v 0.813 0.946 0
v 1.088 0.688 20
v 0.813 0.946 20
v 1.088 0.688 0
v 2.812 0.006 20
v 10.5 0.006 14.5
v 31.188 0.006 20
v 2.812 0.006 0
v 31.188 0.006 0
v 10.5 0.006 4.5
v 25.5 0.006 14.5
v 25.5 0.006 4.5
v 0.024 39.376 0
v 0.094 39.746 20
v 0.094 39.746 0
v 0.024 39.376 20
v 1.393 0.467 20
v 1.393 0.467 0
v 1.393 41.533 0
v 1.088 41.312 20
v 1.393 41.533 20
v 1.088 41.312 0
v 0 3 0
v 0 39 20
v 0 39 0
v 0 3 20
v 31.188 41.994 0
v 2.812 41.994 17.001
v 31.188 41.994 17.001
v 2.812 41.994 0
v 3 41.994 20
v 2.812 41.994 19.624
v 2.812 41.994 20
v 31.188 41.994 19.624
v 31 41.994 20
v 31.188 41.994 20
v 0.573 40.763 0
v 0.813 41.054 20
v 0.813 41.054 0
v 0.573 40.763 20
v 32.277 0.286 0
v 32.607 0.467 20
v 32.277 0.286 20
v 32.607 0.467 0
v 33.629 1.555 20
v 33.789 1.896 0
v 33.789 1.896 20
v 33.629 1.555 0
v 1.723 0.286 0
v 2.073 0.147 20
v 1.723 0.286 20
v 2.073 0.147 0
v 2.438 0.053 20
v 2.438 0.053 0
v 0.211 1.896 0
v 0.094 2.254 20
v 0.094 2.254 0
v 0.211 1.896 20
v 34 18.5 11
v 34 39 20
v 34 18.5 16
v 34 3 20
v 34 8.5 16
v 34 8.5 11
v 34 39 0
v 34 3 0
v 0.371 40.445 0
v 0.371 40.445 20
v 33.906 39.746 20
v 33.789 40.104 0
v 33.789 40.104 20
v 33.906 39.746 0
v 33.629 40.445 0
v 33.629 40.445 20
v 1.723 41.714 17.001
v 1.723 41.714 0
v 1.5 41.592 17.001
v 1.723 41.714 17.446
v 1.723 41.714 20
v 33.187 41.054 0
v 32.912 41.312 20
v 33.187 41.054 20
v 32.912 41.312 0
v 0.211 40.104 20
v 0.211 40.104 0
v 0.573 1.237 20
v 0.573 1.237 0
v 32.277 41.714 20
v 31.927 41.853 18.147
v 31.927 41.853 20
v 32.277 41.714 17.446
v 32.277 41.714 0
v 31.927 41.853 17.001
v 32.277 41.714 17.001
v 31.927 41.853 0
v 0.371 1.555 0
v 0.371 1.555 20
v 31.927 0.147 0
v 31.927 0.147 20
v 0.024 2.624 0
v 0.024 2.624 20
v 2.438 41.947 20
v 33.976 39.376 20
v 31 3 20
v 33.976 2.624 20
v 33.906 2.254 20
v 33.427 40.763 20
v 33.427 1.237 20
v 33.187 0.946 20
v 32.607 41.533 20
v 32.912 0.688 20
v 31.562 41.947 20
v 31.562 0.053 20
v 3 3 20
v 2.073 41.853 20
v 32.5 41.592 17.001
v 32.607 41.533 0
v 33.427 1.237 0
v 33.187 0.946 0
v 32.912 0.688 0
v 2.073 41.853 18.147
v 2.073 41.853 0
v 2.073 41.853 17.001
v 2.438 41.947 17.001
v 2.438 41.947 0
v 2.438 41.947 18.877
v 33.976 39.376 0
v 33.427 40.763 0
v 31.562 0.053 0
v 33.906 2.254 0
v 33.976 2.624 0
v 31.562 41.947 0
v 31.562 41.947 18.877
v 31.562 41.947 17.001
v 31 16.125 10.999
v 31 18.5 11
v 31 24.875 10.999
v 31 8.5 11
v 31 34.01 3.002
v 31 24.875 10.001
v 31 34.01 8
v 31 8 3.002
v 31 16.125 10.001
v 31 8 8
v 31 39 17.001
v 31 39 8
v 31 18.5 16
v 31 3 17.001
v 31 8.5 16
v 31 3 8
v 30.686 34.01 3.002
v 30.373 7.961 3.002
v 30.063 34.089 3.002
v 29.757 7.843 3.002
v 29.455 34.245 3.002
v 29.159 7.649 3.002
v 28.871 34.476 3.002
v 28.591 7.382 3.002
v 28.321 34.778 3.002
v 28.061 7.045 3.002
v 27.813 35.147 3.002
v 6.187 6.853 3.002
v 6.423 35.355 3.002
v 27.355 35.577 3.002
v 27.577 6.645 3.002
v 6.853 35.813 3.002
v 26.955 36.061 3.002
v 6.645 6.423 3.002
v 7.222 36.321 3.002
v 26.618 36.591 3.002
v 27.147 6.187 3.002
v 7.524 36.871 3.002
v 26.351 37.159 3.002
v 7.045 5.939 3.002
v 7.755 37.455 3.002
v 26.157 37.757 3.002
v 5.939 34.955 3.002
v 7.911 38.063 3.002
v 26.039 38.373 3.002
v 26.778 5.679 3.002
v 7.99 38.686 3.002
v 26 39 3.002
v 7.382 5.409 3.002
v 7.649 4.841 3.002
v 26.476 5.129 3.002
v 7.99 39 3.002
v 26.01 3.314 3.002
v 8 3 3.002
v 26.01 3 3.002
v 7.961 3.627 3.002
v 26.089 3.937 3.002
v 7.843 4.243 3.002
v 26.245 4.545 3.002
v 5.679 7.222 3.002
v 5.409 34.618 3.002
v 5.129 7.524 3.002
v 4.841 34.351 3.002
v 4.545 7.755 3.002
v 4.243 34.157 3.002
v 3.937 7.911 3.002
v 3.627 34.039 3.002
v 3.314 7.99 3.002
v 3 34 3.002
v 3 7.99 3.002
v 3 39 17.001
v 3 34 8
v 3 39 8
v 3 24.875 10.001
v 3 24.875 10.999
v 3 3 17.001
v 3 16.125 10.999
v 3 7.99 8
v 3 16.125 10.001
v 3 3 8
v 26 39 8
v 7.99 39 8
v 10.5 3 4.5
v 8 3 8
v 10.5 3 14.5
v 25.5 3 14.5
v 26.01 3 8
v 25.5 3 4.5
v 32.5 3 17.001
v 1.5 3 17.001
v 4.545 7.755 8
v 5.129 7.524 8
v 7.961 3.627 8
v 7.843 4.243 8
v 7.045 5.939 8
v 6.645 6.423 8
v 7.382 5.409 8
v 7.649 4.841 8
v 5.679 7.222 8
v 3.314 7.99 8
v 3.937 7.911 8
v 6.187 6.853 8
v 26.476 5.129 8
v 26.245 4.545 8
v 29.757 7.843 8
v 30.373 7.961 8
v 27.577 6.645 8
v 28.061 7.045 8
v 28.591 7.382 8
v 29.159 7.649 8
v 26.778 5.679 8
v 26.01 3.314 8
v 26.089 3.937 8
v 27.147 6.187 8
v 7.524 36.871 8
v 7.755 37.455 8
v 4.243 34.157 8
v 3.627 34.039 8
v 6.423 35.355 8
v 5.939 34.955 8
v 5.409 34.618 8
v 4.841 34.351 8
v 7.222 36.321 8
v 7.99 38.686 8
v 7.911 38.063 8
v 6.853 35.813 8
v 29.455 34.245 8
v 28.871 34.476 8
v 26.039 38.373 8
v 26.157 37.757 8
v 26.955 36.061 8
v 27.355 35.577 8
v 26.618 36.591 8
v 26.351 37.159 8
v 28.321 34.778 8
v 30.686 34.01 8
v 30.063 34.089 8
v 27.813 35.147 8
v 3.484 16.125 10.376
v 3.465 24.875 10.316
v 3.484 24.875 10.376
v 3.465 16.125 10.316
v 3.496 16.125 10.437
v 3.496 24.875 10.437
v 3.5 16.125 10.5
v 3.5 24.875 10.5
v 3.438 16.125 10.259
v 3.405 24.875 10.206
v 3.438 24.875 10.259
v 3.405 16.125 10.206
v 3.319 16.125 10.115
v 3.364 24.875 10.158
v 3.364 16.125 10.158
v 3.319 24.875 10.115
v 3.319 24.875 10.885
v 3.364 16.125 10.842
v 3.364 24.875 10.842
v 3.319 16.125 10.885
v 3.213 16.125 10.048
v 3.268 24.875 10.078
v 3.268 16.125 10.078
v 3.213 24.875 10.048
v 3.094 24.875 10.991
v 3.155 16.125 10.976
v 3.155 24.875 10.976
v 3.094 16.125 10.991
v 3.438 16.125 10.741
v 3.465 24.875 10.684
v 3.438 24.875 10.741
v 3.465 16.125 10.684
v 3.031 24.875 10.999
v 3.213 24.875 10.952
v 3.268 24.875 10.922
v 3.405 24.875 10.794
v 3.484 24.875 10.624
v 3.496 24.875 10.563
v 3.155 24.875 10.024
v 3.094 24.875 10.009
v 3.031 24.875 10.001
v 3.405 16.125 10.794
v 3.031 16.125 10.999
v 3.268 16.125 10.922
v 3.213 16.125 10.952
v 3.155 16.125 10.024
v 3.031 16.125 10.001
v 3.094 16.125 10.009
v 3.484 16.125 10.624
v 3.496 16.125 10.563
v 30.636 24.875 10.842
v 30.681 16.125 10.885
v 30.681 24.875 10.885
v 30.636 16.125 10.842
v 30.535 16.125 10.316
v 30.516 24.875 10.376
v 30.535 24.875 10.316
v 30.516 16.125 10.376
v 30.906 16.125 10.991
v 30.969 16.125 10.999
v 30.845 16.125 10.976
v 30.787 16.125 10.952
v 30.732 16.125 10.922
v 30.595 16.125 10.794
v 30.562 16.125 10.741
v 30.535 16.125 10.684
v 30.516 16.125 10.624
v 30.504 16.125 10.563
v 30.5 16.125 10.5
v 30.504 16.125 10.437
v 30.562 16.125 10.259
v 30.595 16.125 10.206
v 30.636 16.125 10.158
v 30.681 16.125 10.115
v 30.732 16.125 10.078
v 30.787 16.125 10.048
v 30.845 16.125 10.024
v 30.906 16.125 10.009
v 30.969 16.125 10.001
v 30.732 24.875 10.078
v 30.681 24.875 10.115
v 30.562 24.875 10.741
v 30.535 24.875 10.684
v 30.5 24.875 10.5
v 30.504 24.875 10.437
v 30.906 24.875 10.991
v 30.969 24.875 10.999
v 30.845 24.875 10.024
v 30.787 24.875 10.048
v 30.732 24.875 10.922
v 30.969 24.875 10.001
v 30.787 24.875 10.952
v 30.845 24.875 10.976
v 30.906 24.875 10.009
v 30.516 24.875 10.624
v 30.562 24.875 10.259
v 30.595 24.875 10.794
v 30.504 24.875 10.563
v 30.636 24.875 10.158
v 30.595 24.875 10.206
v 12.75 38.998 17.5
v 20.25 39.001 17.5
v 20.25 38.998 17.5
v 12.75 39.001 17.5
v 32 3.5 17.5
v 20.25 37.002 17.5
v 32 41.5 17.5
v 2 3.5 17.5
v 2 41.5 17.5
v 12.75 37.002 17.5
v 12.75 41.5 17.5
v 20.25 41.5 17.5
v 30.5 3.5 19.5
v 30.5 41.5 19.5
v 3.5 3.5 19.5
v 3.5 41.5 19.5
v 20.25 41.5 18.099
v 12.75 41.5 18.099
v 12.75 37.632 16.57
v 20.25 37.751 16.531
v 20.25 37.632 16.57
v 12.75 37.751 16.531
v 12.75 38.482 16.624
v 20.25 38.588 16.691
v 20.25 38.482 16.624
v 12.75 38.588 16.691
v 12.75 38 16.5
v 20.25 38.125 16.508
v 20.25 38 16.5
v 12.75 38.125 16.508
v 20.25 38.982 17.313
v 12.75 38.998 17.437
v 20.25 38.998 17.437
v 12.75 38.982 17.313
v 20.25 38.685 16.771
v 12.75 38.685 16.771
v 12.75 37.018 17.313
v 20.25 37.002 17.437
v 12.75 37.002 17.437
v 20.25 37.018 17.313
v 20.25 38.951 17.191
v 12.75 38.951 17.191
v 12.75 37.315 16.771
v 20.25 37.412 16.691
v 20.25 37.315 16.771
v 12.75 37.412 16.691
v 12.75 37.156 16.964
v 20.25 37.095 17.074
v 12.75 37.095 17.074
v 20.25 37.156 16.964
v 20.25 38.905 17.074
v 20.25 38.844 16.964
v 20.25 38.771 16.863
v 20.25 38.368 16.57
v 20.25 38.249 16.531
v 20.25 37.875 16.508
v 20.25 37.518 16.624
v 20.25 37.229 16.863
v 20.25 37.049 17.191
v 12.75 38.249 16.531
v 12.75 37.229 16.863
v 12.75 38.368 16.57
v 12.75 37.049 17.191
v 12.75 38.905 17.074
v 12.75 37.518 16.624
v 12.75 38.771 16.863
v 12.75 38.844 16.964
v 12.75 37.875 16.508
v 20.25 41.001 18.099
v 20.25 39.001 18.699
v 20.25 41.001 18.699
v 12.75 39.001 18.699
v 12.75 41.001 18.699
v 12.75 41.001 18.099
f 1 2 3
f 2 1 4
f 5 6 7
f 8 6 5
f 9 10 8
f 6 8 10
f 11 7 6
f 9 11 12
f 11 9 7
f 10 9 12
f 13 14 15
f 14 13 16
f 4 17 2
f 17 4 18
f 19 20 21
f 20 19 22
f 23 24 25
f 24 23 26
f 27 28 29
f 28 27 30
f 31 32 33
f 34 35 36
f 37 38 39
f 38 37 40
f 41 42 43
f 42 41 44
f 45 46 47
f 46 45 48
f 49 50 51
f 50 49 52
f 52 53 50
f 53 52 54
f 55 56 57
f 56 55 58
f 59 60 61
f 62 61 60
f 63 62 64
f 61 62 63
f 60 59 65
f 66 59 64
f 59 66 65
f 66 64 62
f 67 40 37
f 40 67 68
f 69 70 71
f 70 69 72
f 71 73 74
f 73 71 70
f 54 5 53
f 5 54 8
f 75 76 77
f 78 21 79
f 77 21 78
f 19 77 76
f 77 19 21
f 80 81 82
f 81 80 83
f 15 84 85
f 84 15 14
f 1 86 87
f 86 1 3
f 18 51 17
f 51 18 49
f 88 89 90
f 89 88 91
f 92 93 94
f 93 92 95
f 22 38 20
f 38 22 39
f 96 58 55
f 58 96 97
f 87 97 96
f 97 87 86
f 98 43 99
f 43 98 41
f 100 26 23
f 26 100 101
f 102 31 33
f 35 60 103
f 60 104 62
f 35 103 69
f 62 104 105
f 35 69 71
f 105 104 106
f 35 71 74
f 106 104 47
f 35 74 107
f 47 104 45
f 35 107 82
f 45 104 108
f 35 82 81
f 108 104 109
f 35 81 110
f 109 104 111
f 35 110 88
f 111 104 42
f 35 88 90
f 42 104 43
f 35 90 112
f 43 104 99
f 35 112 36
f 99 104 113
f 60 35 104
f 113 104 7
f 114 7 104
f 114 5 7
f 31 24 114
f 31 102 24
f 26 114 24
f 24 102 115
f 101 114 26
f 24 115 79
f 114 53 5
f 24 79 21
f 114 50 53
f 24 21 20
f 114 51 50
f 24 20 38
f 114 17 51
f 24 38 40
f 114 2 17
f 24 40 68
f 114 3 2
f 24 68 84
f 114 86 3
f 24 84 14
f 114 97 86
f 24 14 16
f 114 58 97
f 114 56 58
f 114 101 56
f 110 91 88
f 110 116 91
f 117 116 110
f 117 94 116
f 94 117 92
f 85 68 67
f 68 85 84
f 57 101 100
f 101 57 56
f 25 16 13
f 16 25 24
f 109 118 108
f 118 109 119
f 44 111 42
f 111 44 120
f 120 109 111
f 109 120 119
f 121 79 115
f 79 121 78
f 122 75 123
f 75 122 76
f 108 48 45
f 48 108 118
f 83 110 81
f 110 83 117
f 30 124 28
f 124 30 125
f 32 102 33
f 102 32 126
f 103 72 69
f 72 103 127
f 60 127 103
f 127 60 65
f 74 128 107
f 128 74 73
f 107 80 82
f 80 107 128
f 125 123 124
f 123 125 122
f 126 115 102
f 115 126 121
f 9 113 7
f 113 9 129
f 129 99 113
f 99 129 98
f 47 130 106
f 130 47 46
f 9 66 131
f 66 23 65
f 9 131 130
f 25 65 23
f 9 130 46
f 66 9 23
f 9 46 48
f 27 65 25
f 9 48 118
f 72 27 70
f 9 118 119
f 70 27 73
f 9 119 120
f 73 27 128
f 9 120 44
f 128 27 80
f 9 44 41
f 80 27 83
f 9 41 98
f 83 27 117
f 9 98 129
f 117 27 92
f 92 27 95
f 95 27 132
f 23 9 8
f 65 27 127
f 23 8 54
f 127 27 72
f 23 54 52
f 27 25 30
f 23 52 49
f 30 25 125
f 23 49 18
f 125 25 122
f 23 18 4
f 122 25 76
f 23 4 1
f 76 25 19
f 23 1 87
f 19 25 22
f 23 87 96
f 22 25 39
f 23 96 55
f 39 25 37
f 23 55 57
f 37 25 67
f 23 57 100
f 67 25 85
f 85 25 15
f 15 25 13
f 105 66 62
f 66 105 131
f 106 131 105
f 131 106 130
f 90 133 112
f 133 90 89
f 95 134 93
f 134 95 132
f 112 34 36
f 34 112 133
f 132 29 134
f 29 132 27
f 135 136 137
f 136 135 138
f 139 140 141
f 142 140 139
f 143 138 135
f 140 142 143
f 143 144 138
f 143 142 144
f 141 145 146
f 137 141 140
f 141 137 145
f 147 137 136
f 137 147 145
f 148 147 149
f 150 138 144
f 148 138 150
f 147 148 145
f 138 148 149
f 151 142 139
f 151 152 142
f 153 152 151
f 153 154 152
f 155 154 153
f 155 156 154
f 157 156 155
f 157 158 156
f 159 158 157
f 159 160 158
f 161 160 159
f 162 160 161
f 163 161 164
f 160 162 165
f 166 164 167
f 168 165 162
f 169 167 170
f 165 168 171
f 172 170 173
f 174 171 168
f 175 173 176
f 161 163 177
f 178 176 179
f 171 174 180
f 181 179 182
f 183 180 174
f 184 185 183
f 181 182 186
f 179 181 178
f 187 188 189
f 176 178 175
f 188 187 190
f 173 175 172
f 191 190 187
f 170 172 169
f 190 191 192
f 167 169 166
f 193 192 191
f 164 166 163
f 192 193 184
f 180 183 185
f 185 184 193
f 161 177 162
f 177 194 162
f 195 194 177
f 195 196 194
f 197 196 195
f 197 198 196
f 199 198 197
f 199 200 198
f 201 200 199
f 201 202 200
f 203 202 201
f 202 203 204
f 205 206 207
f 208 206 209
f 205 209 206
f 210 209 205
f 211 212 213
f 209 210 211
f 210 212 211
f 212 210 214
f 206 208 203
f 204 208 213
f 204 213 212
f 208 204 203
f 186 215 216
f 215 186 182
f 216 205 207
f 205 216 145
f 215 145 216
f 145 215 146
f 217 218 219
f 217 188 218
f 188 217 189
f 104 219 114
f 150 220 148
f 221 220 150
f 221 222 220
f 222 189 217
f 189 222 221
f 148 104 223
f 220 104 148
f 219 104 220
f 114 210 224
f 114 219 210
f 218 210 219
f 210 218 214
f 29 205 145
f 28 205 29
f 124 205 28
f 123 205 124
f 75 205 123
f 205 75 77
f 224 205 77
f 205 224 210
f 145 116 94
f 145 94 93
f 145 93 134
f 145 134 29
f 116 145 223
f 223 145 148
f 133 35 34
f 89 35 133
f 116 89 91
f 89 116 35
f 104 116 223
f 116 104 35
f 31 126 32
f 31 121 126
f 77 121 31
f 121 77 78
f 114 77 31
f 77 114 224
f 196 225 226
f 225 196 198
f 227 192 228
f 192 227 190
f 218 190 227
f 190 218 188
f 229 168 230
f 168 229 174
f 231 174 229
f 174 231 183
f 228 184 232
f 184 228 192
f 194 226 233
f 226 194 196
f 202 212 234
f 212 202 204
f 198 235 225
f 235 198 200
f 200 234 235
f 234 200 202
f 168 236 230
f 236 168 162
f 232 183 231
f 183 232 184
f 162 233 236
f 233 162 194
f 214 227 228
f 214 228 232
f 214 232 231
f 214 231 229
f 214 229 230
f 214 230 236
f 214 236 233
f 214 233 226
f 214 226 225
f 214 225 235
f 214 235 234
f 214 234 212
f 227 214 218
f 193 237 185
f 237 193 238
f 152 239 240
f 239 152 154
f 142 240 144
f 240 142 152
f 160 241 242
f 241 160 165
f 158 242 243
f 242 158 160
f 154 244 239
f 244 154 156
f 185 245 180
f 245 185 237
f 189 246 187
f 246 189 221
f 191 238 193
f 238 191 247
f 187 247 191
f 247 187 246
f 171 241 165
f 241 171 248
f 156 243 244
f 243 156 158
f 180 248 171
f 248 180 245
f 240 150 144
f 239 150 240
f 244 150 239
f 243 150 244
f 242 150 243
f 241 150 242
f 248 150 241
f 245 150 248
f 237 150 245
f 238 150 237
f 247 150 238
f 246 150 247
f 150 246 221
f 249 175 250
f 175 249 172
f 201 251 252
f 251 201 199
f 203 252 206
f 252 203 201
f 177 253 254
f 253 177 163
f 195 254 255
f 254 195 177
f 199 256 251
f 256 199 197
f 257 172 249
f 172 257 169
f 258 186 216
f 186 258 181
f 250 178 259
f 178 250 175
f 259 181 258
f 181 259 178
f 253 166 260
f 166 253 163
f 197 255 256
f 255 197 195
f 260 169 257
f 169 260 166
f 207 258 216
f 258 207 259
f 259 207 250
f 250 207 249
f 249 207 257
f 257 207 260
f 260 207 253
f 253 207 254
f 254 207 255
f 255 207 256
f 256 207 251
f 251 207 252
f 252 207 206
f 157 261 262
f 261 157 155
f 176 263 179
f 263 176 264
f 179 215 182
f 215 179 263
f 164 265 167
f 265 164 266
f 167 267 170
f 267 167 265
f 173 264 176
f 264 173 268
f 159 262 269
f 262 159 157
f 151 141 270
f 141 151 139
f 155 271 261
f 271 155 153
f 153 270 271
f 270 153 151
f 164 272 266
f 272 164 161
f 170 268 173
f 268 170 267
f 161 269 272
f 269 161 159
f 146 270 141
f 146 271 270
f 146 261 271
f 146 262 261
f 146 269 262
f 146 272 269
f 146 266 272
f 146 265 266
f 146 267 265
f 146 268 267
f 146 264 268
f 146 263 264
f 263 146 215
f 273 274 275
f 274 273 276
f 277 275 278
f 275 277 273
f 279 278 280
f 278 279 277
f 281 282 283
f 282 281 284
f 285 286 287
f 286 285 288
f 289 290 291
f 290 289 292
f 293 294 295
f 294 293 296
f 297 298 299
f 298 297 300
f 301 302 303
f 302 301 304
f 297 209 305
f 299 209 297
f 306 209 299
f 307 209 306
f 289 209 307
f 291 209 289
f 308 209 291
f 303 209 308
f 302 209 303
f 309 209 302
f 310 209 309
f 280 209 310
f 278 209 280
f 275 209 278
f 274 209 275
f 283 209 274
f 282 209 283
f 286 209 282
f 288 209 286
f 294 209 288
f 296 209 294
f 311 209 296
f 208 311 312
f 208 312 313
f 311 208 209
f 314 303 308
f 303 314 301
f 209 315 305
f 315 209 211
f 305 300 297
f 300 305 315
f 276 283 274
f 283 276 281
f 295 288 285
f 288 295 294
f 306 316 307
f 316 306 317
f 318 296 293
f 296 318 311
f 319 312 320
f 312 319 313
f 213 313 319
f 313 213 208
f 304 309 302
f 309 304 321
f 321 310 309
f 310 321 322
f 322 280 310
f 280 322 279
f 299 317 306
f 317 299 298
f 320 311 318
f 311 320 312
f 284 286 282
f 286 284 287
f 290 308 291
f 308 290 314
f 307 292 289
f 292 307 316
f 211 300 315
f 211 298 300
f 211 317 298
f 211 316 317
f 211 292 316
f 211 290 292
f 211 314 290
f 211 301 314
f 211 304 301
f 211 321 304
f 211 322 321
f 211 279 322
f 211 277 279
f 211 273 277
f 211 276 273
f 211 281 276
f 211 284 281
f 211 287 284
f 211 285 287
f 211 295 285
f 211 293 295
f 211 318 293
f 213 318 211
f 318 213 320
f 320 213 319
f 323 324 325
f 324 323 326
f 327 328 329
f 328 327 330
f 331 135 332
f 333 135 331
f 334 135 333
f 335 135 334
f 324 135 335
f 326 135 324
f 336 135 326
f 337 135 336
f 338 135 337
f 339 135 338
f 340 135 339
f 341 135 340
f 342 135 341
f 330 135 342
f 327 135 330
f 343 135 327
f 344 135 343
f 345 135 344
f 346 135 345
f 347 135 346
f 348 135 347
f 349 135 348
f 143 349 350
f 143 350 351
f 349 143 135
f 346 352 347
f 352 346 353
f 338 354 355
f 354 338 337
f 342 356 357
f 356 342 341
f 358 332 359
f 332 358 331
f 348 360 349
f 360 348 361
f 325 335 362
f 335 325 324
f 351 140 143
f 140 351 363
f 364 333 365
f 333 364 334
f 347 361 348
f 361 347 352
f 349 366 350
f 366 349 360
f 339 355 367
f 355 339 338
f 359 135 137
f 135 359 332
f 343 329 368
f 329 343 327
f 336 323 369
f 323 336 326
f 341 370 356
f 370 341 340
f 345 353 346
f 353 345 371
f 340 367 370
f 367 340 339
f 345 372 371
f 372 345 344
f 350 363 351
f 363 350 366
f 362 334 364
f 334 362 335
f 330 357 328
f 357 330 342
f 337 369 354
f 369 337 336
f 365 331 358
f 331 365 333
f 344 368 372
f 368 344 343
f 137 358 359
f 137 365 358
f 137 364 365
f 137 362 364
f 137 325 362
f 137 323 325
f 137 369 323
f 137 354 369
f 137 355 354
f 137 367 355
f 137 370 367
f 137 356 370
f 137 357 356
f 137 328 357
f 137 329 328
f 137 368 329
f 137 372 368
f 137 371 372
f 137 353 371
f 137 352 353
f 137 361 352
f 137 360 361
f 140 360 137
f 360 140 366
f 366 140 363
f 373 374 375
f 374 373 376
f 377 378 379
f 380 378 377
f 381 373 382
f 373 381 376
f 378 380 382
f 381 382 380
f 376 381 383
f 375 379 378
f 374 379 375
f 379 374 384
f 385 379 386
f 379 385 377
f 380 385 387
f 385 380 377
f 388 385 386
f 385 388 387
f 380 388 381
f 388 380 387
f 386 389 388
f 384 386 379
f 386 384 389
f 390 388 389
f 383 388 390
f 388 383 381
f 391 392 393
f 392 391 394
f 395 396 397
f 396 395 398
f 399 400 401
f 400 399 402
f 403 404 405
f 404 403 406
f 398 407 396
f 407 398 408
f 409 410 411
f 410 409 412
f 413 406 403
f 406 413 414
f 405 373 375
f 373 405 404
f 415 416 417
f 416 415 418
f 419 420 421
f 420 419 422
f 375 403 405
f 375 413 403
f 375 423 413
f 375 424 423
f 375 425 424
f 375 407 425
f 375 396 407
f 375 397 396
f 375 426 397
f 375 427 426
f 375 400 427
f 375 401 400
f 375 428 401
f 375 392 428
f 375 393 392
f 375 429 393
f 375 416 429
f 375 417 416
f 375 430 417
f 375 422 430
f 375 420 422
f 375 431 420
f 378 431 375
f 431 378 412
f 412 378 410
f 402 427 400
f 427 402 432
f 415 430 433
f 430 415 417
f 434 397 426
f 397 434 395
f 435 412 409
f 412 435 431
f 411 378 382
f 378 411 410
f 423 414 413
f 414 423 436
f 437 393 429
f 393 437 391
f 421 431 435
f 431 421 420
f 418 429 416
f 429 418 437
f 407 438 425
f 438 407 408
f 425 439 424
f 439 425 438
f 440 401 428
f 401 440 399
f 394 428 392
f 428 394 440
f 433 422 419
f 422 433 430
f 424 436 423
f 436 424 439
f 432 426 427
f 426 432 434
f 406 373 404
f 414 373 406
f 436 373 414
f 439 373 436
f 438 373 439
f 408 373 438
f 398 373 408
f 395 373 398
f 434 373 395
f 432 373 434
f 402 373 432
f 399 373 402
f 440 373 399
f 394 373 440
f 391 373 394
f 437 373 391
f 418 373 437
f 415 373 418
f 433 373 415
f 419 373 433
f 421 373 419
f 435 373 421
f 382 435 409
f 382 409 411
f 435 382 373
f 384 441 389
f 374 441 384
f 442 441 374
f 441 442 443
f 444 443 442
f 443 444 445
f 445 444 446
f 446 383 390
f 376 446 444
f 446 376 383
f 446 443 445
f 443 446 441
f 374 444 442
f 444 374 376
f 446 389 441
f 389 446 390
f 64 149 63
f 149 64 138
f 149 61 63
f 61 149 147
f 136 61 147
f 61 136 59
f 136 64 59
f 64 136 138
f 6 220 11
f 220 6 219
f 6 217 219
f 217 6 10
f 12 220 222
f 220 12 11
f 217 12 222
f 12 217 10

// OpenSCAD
// file: project_box.scad
/* Project box

   A parametric box for electronics projects using perforated circuit boards. The
   board is held above the bottom of the box by four corner supports, and snaps
   into place to hold it snugly while allowing easy removal.

   Shapes provided as children will be used as cutouts, translated to the origin
   point of the top of the circuit board. Modules are provided for cutting out
   two-dimensional shapes from each wall face as well as the lid.
*/

$fn=50;

mode = "case";         // ["case", "lid", "all"]
board_x = 50;
board_y = 70;
board_thickness = 1;   // [1:10]
clearance_above = 20;  // [5:50]
clearance_below = 10;  // [5:50]
fit_tolerance = 0.5;
corner_radius=3;       // [1:10]
support_radius=5;      // [1:10]
wall_width=3;          // [3:10]

module _rounded_box(box, r) {
  hull() {
    translate([0 + r,0 + r,0])
      cylinder(h=box.z,r=r);
    translate([box.x - r,0 + r,0])
      cylinder(h=box.z, r=r);
    translate([box.x - r,box.y - r,0])
      cylinder(h=box.z, r=r);
    translate([0 + r,box.y - r,0])
      cylinder(h=box.z, r=r);
  }
}

module corner_post(h, r) {
  intersection() {
    translate([-0.001,-0.001,-0.001])
      cube([r*1.1, r*1.1, h*1.2]);
    cylinder(h=h, r=r);
  }
}

module lid_base(dimensions, slot_depth=1.5) {
  polyhedron([// bottom face
              [0, 0, 0],
              [dimensions.x, 0, 0],
              [dimensions.x, dimensions.y, 0],
              [0, dimensions.y, 0],
              // top face
              [slot_depth, 0, dimensions.z],
              [dimensions.x - slot_depth, 0, dimensions.z],
              [dimensions.x - slot_depth, dimensions.y, dimensions.z],
              [slot_depth, dimensions.y, dimensions.z]],
             [[0,1,2,3],
              [4,5,1,0],
              [7,6,5,4],
              [5,6,2,1],
              [6,7,3,2],
              [7,4,0,3]]);
}

module lid(dimensions, slot_depth=1.5, wall_width=3, fit_tolerance=0.5) {
  indent_width = dimensions.x / 4;
  difference() {
    union() {
      lid_base([dimensions.x, dimensions.y, dimensions.z], slot_depth);
      // locking tab
      translate([dimensions.x / 2 - indent_width / 2 - fit_tolerance,
                 dimensions.y - wall_width - fit_tolerance,
                 0])
        rotate([0, 90, 0])
        cylinder(h=dimensions.x / 4, r=2*fit_tolerance);
    }
    // pull handle
    translate([dimensions.x / 2 - indent_width / 2 - fit_tolerance,
               dimensions.y - wall_width + fit_tolerance + 0.001,
               -0.001]) {
      cube([indent_width,wall_width - 2 * fit_tolerance,0.6 * dimensions.z]);
      cube([indent_width,2 + wall_width - 2 * fit_tolerance,0.3 * dimensions.z]);
    }
  }
}

module project_box(box,
                   below=10,
                   board_thickness=1,
                   fit_tolerance=0.5,
                   corner_radius=3,
                   support_radius=5,
                   wall_width=3,
                   mode="case") {
  internal_width = box.x + (fit_tolerance * 2);  // tolerance on either side
  internal_depth = box.y + (fit_tolerance * 2);  // tolerance on either side

  internal_height = (fit_tolerance      // top tolerance
                     + box.z            // project height
                     + board_thickness  // board height
                     + below            // bottom clearance
                     + fit_tolerance);  // bottom tolerance

  lid_width = internal_width + wall_width;  // Extends halfway into each side wall
  lid_depth = internal_depth + wall_width;  // Extends out of one wall
  lid_height = wall_width;         // Replaces most of the top wall

  // case
  if ((mode == "case") || (mode == "all")) {
    difference() {
      union() {
        // hollow shell
        difference() {
          _rounded_box([internal_width + (wall_width * 2),
                        internal_depth + (wall_width * 2),
                        internal_height + (wall_width * 2)],
                       r=corner_radius);
          translate([wall_width,wall_width,wall_width + 0.002])
            cube([internal_width, internal_depth, internal_height]);
          // lid slot
          translate([wall_width / 2, wall_width, internal_height + wall_width + 0.001]) {
            lid_base([lid_width, lid_depth, lid_height]);
          }
        }
        // supports
        translate([wall_width,wall_width,wall_width]) {
          translate([0,0,0])
            corner_post(h=below, r=support_radius);
          translate([internal_width, 0, 0])
            rotate([0,0,90])
            corner_post(h=below, r=support_radius);
          translate([0,internal_depth, 0])
            rotate([0,0,270])
            corner_post(h=below, r=support_radius);
          translate([internal_width, internal_depth, 0])
            rotate([0,0,180])
            corner_post(h=below, r=support_radius);
        }

        // locking nubs
        translate([wall_width,wall_width,wall_width]) {
          nub_size = fit_tolerance * 2;
          nub_width = box.y / 4;
          nub_height = below + board_thickness + (nub_size/2) + (fit_tolerance*2);
          translate([0,box.y / 2 - nub_width / 2,nub_height])
            rotate([270,0,0])
            cylinder(h=nub_width, r=nub_size/2);
          translate([internal_width,box.y / 2 - nub_width / 2,nub_height])
            rotate([270,0,0])
            cylinder(h=nub_width, r=nub_size/2);
        }
        if (mode == "all") {
          // lid
          translate([wall_width / 2 + fit_tolerance,
                     wall_width + fit_tolerance,
                     internal_height + wall_width + fit_tolerance]) {
            lid([lid_width - (fit_tolerance * 2),
                 lid_depth - (fit_tolerance * 2),
                 lid_height - (fit_tolerance * 2)]);
          }
        }
      }
      // cutouts
      translate([wall_width + fit_tolerance,
                 wall_width + fit_tolerance,
                 fit_tolerance + wall_width + below + board_thickness])
        children();
    }
  } else if (mode == "lid") {
    // Flip the lid and translate it into place for printing
    translate([lid_width - (fit_tolerance * 2),0,lid_height - (fit_tolerance * 2)]) {
      rotate([0, 180, 0]) {
        difference() {
          translate([wall_width / 2 + fit_tolerance,
                     wall_width + fit_tolerance, 0]) {
            lid([lid_width - (fit_tolerance * 2),
                 lid_depth - (fit_tolerance * 2),
                 lid_height - (fit_tolerance * 2)]);
          }
          translate([wall_width + fit_tolerance,
                     wall_width + fit_tolerance,
                     below + board_thickness - internal_height]) {
            #children();
          }
        }
      }
    }
  }
}

module cutout_front(box, wall_width=3, fit_tolerance=0.5) {
  rotate([90, 0, 0])
    linear_extrude(height=wall_width + fit_tolerance + 0.001)
    children(0);
}

module cutout_back(box, wall_width=3, fit_tolerance=0.5)  {
  translate([box.x,box.y,0])
    rotate([90, 0, 180])
    linear_extrude(height=wall_width + fit_tolerance + .001)
    children(0);
}

module cutout_right(box, wall_width=3, fit_tolerance=0.5) {
  translate([box.x,0,0])
    rotate([90, 0, 90])
    linear_extrude(height=wall_width + fit_tolerance + 0.001)
    children(0);
}

module cutout_left(box, wall_width=3, fit_tolerance=0.5) {
  translate([0, box.y, 0])
    rotate([90, 0, 270])
    linear_extrude(height=wall_width + fit_tolerance + 0.001)
    children(0);
}

module cutout_top(box, wall_width=3, fit_tolerance=0.5) {
  translate([0, 0 - wall_width - fit_tolerance, box.z])
    linear_extrude(height=wall_width + fit_tolerance + 0.001)
    children(0);
}

project_box([board_x, board_y, clearance_above],
            below=clearance_below,
            board_thickness=board_thickness,
            fit_tolerance=fit_tolerance,
            corner_radius=corner_radius,
            support_radius=support_radius,
            wall_width=wall_width,
            mode=mode);
// main file
/* WLED Controller
 *
 * A version of the project box designed to encase an ESP8266 Wemos D1-Mini with
 * a slot for wires connecting to its pins. Assumes a right-angle connector is
 * soldered to the board.
 */

use <project_box.scad>
$fn=50;

mode = "all"; // ["case", "lid", "all"]

x = 27;
y = 35;
z = 7;
below = 5;

project_box([x, y, z],
            below=below,
            mode=mode) {
  // Switch Sensor (Left)
  cutout_right([x,y,z])
    translate([5,1.5])
    square([10,5]);
  // USB Port (Front)
  cutout_front([x,y,z])
    translate([7, -5, 0])
    square([15,10]);

}
